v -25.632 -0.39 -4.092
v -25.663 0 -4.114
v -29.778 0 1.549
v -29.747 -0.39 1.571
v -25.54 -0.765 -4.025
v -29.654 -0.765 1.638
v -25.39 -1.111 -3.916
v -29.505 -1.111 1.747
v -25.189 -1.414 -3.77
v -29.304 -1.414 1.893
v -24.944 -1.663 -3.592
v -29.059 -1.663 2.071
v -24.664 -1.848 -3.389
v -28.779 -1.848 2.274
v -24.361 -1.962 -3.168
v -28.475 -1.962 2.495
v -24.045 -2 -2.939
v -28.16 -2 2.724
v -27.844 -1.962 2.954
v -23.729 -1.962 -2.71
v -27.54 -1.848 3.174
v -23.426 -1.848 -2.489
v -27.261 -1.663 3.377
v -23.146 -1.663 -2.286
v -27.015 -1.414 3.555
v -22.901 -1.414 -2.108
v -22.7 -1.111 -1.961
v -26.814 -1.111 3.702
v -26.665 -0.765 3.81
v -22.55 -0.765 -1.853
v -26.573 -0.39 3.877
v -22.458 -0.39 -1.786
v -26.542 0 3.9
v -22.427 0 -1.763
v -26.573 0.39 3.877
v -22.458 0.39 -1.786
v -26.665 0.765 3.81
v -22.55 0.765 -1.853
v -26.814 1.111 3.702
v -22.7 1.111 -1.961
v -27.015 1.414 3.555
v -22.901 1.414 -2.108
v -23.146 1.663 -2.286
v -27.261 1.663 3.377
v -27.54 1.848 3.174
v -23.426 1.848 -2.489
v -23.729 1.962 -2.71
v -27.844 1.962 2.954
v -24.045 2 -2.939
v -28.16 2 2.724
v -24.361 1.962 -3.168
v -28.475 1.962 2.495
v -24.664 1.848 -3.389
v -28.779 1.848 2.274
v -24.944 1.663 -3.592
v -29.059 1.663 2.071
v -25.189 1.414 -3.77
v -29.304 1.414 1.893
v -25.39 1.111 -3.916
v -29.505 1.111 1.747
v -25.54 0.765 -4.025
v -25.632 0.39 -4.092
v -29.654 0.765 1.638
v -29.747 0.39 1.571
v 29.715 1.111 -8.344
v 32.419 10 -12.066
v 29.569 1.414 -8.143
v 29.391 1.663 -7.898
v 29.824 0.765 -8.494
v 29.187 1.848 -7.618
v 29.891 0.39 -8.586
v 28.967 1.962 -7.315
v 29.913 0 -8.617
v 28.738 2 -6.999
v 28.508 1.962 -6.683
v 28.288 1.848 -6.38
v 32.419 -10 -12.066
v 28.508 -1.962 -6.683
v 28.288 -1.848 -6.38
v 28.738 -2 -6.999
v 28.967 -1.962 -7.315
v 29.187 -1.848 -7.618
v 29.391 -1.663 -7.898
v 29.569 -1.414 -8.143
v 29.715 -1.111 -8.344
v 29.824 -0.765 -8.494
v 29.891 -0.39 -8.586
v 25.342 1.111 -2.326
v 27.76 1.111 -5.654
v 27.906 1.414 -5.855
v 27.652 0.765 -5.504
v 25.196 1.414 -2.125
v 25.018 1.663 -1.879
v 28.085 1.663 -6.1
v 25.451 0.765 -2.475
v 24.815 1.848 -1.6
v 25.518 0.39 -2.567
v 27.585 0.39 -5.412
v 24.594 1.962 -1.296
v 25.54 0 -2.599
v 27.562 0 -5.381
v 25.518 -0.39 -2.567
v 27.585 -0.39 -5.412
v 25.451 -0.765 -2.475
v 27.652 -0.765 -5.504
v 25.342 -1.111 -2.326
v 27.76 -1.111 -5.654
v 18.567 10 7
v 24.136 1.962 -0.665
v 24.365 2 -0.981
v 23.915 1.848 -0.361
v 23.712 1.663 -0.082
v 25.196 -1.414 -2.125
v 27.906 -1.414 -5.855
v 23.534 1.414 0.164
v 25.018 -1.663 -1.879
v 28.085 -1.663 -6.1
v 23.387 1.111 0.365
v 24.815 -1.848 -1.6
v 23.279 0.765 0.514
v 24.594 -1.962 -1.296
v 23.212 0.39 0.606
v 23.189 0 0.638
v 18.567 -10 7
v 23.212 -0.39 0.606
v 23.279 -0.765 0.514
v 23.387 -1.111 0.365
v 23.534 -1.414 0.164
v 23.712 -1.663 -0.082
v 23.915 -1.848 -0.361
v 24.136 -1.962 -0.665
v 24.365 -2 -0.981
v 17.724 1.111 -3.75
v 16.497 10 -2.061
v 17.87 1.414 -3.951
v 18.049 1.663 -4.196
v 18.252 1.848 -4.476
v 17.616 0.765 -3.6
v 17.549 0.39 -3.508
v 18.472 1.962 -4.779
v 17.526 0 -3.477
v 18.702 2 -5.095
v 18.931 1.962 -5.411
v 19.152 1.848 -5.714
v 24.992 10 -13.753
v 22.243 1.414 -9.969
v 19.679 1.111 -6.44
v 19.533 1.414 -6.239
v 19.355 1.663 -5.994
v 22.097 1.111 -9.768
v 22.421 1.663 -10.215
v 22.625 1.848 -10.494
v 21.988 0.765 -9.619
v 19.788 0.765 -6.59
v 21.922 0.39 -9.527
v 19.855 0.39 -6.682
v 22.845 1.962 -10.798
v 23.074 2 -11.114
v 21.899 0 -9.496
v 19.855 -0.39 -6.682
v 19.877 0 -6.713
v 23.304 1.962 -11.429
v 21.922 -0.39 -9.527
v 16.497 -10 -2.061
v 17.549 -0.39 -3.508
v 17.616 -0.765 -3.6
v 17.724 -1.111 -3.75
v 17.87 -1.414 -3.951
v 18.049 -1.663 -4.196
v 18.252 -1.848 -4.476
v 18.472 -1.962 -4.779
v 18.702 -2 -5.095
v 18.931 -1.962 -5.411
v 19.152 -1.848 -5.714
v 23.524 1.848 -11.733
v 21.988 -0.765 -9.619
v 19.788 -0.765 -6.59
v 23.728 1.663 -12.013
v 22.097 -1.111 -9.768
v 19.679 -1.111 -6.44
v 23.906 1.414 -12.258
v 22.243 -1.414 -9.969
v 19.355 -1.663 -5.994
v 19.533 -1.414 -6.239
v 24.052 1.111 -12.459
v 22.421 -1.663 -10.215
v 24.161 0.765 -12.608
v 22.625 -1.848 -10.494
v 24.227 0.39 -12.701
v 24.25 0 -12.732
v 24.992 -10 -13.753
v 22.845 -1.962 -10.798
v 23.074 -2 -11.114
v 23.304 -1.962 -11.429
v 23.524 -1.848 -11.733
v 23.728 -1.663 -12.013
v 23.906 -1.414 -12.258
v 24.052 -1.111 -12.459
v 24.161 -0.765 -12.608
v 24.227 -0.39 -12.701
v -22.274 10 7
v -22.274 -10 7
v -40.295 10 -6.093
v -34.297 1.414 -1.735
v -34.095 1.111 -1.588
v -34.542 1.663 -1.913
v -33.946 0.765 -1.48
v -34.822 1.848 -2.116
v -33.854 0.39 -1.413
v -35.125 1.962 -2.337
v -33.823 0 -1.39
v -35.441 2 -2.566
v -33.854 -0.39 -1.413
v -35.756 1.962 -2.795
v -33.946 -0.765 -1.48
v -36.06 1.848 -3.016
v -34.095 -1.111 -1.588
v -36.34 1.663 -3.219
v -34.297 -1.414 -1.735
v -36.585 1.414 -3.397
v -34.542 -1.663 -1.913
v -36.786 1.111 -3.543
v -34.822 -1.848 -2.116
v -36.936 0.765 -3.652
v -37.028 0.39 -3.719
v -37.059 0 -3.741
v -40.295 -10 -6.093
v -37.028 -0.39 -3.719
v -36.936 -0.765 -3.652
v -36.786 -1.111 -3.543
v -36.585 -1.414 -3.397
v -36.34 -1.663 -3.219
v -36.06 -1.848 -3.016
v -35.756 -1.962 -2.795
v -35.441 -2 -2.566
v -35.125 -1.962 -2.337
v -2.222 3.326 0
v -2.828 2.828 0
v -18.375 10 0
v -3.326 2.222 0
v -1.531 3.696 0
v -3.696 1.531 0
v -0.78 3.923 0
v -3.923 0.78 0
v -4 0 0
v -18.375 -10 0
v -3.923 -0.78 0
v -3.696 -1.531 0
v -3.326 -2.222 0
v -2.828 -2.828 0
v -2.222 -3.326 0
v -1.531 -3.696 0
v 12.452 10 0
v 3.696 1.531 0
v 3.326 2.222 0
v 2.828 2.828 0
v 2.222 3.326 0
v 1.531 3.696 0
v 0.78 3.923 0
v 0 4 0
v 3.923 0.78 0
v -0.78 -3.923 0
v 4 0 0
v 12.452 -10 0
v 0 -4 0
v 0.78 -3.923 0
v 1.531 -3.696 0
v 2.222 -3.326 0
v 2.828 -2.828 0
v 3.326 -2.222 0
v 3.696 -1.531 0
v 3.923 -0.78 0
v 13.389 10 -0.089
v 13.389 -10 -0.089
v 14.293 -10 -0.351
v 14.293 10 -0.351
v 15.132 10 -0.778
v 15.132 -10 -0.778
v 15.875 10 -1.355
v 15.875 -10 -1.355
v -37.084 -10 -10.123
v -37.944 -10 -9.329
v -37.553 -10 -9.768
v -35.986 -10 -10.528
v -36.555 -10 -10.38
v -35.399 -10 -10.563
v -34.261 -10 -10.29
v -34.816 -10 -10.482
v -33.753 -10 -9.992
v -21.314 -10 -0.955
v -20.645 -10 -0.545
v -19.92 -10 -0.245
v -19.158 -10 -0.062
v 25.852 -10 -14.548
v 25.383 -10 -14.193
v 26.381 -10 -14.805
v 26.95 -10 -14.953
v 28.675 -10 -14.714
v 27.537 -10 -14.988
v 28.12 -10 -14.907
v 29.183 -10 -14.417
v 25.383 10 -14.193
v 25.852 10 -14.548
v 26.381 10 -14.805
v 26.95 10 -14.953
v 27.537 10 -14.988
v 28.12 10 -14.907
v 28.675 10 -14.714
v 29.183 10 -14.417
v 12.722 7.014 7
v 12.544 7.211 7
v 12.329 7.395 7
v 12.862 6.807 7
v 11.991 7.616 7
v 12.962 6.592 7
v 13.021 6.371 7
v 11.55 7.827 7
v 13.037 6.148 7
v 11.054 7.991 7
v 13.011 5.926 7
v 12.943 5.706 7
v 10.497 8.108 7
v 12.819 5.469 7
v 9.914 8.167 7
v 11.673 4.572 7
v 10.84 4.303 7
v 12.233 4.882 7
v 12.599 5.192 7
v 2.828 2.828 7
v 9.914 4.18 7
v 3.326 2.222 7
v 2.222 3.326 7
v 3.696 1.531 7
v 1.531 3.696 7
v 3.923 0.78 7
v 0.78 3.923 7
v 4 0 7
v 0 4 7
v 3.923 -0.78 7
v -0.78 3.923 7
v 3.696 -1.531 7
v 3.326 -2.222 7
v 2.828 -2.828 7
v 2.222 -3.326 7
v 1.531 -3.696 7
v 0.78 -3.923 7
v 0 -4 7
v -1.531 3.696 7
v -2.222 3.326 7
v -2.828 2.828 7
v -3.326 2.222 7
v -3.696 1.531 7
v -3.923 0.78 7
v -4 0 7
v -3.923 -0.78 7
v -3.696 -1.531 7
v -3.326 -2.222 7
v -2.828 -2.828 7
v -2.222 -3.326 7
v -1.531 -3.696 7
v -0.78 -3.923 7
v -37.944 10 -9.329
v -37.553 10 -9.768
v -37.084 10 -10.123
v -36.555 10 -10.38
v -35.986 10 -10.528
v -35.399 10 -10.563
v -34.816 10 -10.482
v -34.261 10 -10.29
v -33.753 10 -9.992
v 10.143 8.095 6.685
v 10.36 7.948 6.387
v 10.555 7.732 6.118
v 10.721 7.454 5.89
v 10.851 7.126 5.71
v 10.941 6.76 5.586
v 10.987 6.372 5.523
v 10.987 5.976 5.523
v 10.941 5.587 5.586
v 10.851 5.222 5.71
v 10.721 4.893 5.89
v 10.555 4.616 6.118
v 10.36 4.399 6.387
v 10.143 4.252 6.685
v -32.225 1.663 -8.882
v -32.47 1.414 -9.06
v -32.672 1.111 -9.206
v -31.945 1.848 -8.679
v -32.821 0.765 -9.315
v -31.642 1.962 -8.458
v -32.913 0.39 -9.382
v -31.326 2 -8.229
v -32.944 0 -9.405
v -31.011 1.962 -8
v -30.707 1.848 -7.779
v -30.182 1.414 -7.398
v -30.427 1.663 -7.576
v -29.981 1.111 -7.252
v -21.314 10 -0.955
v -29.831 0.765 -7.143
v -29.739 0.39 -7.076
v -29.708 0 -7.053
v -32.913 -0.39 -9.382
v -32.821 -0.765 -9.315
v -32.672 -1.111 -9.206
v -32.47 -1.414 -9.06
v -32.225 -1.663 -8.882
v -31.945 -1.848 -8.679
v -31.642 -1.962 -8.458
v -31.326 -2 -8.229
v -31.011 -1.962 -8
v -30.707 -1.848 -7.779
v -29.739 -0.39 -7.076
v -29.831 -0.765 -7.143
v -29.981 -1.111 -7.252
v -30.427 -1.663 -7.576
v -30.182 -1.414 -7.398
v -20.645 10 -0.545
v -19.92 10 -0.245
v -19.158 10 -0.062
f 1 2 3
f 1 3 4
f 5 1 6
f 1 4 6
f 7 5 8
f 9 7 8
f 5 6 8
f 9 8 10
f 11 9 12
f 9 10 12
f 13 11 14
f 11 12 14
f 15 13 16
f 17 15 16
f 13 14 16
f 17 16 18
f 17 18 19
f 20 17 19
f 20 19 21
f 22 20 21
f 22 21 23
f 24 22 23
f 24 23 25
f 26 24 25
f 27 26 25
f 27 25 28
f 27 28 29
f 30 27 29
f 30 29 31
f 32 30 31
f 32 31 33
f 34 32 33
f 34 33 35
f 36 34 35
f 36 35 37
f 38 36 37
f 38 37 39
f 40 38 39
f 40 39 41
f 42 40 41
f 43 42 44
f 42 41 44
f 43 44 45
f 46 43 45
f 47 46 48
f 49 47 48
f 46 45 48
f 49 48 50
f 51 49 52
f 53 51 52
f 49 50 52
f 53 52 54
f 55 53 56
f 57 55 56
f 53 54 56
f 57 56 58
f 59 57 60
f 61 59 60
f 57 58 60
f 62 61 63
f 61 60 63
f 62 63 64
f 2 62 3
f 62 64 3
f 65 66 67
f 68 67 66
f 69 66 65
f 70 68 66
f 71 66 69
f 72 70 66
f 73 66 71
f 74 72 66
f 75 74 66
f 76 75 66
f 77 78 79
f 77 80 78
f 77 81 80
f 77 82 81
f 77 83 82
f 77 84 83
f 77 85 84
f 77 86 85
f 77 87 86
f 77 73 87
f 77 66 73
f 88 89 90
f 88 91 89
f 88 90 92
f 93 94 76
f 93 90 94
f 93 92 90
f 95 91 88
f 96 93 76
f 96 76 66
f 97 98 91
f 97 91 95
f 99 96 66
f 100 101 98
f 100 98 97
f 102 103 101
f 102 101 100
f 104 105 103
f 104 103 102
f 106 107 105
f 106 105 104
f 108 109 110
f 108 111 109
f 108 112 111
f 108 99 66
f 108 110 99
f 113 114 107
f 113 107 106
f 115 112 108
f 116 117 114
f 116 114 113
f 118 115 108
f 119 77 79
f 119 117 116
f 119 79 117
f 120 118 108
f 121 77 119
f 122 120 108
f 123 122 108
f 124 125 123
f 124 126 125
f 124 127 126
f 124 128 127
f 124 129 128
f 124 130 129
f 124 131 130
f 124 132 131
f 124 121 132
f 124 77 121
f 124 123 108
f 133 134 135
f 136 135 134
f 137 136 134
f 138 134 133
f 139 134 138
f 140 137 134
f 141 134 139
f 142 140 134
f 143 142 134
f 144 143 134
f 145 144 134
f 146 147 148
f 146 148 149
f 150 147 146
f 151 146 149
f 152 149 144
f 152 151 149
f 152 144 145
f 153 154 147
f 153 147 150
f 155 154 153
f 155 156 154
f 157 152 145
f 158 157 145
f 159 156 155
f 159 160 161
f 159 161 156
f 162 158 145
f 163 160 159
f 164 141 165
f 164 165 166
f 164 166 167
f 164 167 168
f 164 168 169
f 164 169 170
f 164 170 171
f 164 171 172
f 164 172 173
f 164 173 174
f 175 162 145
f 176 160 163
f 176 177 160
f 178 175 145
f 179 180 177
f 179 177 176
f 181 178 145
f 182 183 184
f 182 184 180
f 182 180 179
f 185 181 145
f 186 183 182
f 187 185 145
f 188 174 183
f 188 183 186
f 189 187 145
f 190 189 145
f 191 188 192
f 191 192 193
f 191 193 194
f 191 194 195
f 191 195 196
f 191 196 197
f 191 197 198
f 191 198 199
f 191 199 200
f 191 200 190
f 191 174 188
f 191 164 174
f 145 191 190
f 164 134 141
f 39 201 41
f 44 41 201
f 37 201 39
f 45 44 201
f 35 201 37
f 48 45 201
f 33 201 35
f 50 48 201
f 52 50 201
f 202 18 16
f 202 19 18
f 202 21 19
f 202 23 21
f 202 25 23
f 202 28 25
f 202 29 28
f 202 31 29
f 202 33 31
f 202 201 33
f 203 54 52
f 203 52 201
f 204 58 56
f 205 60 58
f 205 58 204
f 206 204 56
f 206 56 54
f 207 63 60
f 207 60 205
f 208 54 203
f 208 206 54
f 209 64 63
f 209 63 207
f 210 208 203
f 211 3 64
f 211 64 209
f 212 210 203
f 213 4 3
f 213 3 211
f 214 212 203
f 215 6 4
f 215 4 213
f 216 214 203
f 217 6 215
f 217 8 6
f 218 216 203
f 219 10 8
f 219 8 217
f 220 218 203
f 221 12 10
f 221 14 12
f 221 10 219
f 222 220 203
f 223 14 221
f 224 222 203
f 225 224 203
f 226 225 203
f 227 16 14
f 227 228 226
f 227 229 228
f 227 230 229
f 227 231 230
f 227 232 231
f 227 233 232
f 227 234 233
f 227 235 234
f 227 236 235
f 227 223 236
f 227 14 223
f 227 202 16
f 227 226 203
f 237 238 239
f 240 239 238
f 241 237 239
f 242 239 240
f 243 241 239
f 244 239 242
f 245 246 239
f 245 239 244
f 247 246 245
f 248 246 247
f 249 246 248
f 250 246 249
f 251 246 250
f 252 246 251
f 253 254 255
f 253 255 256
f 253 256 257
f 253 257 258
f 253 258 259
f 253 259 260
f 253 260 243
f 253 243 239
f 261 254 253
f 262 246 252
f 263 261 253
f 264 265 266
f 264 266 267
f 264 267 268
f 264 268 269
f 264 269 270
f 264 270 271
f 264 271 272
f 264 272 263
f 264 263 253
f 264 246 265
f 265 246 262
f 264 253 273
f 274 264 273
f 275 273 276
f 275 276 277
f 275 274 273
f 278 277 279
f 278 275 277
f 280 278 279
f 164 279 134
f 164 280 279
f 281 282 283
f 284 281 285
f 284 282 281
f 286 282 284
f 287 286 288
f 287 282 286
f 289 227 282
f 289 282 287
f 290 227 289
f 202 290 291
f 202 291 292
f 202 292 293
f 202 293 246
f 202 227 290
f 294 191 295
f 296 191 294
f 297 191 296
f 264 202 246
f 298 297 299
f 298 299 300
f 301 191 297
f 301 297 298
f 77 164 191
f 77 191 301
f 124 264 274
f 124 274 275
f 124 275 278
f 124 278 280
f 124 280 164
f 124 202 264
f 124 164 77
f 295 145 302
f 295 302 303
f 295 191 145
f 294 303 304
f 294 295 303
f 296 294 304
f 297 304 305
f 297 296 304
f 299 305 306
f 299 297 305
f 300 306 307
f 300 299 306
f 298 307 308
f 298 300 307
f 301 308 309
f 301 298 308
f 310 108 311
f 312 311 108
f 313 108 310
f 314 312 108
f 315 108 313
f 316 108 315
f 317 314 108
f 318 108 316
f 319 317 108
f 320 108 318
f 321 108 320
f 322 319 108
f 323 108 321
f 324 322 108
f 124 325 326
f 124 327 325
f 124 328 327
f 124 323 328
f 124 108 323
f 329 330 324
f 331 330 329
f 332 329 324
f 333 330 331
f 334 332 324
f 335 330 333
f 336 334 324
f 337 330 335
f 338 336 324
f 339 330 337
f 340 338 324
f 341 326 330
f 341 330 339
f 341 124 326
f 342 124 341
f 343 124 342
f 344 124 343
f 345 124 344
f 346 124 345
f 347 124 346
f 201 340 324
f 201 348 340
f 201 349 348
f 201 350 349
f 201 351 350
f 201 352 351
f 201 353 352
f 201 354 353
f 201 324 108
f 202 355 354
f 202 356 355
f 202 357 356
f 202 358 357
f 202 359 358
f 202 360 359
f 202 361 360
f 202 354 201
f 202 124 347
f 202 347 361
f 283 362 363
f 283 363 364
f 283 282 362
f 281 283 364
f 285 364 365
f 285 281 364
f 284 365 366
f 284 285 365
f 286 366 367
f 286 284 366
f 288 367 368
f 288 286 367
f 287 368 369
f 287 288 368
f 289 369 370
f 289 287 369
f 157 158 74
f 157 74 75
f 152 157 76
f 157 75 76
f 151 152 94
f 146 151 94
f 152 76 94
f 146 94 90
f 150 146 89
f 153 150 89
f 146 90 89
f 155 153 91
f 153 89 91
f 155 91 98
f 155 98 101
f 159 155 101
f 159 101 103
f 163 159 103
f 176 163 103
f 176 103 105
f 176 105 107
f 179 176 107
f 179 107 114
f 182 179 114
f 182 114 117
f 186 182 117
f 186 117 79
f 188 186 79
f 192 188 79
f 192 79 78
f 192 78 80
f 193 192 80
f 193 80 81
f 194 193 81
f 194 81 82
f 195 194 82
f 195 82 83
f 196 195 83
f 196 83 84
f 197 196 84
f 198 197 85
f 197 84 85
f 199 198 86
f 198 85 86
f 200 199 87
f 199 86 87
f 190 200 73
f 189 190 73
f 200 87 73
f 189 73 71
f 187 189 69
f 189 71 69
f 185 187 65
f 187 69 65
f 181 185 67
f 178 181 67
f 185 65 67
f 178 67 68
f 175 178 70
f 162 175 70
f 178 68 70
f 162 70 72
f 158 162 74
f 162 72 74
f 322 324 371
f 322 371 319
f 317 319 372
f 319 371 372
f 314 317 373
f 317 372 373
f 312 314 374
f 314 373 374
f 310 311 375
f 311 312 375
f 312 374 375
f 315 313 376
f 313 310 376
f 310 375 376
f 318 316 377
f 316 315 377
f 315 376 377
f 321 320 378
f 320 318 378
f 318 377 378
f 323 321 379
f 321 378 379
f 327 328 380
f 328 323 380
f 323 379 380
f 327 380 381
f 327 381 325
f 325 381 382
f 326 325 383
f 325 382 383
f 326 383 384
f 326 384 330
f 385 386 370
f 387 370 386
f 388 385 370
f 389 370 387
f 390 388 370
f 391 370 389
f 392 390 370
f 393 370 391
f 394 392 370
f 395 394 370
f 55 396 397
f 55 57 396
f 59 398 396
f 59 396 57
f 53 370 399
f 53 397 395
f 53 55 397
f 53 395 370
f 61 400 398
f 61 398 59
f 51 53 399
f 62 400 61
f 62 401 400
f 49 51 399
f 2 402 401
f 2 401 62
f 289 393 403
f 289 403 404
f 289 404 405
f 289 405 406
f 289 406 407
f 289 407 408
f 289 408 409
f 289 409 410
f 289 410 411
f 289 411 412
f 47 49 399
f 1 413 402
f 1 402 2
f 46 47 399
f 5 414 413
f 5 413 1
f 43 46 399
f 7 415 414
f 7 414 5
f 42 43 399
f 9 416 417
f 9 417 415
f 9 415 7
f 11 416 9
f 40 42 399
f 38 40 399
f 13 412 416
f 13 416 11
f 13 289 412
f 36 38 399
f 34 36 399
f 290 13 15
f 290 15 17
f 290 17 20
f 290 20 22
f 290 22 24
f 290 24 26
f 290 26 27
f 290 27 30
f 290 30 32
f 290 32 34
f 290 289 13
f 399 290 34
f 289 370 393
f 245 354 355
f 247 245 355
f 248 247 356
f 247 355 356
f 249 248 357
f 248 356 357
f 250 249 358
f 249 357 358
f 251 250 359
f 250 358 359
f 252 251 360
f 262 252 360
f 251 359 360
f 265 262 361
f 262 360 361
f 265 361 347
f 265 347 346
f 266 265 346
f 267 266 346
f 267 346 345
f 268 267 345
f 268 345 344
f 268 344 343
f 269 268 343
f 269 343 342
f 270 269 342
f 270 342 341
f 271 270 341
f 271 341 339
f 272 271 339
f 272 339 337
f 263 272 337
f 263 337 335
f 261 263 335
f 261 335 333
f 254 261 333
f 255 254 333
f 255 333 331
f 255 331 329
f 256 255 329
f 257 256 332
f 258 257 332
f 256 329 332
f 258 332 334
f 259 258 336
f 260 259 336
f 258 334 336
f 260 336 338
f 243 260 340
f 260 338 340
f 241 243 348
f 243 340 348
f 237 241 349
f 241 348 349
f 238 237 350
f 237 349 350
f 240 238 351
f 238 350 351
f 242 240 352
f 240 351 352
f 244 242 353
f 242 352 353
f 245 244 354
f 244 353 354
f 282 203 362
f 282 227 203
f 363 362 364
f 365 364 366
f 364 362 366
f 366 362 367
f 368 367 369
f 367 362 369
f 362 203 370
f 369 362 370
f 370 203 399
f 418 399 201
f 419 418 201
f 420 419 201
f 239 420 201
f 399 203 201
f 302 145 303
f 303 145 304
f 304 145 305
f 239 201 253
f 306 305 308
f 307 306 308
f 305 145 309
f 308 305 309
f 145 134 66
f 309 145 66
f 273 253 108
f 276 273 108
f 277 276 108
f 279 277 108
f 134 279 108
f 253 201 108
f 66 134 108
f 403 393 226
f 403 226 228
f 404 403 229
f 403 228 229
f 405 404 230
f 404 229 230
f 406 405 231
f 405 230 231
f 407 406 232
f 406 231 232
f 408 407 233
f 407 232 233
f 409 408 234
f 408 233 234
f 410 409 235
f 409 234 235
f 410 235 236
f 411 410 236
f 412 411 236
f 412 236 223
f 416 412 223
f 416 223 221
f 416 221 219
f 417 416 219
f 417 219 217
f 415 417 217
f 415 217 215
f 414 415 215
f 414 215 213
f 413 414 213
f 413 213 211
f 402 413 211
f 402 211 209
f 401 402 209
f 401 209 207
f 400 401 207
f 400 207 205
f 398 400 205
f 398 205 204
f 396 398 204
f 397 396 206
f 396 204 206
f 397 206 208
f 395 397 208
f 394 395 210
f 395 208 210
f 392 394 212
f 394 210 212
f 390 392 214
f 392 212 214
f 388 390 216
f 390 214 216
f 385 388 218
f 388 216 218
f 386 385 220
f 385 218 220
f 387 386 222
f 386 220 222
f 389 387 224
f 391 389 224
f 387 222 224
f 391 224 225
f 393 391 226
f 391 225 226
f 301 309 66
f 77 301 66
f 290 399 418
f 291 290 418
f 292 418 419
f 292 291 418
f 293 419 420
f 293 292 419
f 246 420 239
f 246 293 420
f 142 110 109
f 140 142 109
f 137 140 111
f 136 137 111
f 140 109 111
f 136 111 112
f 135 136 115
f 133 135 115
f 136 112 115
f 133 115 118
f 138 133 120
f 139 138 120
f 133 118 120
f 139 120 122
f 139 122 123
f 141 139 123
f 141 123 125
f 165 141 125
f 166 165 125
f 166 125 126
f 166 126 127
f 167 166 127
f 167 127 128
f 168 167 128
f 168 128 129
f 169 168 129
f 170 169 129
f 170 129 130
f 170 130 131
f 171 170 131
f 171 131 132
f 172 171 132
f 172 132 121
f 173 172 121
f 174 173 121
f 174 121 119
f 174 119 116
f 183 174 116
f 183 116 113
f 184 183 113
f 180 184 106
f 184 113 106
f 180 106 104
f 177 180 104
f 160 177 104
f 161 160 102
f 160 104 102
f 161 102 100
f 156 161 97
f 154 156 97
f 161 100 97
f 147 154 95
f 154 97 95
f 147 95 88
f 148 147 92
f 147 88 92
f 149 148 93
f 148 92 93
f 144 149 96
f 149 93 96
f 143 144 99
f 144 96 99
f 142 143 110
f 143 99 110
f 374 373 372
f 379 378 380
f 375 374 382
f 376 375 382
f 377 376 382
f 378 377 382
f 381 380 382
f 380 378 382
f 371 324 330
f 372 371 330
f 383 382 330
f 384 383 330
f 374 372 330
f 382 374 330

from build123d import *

# Parameters (mm, degrees)
F1_DEPTH      = 10
F1_DEPTH_BACK = 10
F3_D          = 4
F5_D          = 4
F5_DEPTH      = 18.2076214093
F7_D          = 8
F8_R          = 3
F9_R          = 5
F11_D         = 4


with BuildPart() as f1:
    # F0 (on Front) → F1 (new body, two sides)
    with BuildSketch(Plane.XZ) as f1_sk:
        Polygon((-40.2948366535, -6.0925860852), (-36.1803398875, -11.7557050458), (-20, 0), (15, 0), (26.7557050458, -16.1803398875), (32.4188240065, -12.0658431215), (18.5666781465, 7), (-22.2744378736, 7), align=None)
    extrude(amount=F1_DEPTH)
    extrude(f1_sk.sketch, amount=-F1_DEPTH_BACK)

    # F3 (through all)
    with Locations(Plane(origin=(-6.9098300563, 0, 9.510565163), x_dir=(0.8090169944, 0, 0.5877852523), z_dir=(0.5877852523, 0, -0.8090169944))):
        with Locations((0, -37.8532769899), (0, -24.0082326065), (-30.1803398875, 0), (-21.1803398875, 0)):
            Hole(F3_D / 2)

    # F5 (through all, one way)
    with BuildSketch(Plane(origin=(9.8176274578, 0, 7.1329238722), x_dir=(0, -1, 0), z_dir=(-0.8090169944, 0, -0.5877852523))):
        with Locations((16.0583042515, 0), (-6.1736582538, 0)):
            Circle(F5_D / 2)
    extrude(amount=-F5_DEPTH, mode=Mode.SUBTRACT)

    # F7 (through all)
    with Locations(Plane(origin=(0, 0, 0), x_dir=(1, 0, 0), z_dir=(0, 0, -1))):
        with Locations((0, 0)):
            Hole(F7_D / 2)

    # F8
    f8_edges = [f1.edges().sort_by_distance(p)[0] for p in [
        (-36.18034, 0, -11.755705),
        (26.755705, 0, -16.18034),
    ]]
    fillet(f8_edges, radius=F8_R)

    # F9
    f9_edges = [f1.edges().sort_by_distance(p)[0] for p in [
        (-20, 0, 0),
        (15, 0, 0),
    ]]
    fillet(f9_edges, radius=F9_R)

    # F11 (through all)
    with Locations(Plane(origin=(9.8176274578, 0, 7.1329238722), x_dir=(0, -1, 0), z_dir=(-0.8090169944, 0, -0.5877852523))):
        with Locations((0, -15.1145784184), (0, -22.5539375097)):
            Hole(F11_D / 2)


solid = f1.part
